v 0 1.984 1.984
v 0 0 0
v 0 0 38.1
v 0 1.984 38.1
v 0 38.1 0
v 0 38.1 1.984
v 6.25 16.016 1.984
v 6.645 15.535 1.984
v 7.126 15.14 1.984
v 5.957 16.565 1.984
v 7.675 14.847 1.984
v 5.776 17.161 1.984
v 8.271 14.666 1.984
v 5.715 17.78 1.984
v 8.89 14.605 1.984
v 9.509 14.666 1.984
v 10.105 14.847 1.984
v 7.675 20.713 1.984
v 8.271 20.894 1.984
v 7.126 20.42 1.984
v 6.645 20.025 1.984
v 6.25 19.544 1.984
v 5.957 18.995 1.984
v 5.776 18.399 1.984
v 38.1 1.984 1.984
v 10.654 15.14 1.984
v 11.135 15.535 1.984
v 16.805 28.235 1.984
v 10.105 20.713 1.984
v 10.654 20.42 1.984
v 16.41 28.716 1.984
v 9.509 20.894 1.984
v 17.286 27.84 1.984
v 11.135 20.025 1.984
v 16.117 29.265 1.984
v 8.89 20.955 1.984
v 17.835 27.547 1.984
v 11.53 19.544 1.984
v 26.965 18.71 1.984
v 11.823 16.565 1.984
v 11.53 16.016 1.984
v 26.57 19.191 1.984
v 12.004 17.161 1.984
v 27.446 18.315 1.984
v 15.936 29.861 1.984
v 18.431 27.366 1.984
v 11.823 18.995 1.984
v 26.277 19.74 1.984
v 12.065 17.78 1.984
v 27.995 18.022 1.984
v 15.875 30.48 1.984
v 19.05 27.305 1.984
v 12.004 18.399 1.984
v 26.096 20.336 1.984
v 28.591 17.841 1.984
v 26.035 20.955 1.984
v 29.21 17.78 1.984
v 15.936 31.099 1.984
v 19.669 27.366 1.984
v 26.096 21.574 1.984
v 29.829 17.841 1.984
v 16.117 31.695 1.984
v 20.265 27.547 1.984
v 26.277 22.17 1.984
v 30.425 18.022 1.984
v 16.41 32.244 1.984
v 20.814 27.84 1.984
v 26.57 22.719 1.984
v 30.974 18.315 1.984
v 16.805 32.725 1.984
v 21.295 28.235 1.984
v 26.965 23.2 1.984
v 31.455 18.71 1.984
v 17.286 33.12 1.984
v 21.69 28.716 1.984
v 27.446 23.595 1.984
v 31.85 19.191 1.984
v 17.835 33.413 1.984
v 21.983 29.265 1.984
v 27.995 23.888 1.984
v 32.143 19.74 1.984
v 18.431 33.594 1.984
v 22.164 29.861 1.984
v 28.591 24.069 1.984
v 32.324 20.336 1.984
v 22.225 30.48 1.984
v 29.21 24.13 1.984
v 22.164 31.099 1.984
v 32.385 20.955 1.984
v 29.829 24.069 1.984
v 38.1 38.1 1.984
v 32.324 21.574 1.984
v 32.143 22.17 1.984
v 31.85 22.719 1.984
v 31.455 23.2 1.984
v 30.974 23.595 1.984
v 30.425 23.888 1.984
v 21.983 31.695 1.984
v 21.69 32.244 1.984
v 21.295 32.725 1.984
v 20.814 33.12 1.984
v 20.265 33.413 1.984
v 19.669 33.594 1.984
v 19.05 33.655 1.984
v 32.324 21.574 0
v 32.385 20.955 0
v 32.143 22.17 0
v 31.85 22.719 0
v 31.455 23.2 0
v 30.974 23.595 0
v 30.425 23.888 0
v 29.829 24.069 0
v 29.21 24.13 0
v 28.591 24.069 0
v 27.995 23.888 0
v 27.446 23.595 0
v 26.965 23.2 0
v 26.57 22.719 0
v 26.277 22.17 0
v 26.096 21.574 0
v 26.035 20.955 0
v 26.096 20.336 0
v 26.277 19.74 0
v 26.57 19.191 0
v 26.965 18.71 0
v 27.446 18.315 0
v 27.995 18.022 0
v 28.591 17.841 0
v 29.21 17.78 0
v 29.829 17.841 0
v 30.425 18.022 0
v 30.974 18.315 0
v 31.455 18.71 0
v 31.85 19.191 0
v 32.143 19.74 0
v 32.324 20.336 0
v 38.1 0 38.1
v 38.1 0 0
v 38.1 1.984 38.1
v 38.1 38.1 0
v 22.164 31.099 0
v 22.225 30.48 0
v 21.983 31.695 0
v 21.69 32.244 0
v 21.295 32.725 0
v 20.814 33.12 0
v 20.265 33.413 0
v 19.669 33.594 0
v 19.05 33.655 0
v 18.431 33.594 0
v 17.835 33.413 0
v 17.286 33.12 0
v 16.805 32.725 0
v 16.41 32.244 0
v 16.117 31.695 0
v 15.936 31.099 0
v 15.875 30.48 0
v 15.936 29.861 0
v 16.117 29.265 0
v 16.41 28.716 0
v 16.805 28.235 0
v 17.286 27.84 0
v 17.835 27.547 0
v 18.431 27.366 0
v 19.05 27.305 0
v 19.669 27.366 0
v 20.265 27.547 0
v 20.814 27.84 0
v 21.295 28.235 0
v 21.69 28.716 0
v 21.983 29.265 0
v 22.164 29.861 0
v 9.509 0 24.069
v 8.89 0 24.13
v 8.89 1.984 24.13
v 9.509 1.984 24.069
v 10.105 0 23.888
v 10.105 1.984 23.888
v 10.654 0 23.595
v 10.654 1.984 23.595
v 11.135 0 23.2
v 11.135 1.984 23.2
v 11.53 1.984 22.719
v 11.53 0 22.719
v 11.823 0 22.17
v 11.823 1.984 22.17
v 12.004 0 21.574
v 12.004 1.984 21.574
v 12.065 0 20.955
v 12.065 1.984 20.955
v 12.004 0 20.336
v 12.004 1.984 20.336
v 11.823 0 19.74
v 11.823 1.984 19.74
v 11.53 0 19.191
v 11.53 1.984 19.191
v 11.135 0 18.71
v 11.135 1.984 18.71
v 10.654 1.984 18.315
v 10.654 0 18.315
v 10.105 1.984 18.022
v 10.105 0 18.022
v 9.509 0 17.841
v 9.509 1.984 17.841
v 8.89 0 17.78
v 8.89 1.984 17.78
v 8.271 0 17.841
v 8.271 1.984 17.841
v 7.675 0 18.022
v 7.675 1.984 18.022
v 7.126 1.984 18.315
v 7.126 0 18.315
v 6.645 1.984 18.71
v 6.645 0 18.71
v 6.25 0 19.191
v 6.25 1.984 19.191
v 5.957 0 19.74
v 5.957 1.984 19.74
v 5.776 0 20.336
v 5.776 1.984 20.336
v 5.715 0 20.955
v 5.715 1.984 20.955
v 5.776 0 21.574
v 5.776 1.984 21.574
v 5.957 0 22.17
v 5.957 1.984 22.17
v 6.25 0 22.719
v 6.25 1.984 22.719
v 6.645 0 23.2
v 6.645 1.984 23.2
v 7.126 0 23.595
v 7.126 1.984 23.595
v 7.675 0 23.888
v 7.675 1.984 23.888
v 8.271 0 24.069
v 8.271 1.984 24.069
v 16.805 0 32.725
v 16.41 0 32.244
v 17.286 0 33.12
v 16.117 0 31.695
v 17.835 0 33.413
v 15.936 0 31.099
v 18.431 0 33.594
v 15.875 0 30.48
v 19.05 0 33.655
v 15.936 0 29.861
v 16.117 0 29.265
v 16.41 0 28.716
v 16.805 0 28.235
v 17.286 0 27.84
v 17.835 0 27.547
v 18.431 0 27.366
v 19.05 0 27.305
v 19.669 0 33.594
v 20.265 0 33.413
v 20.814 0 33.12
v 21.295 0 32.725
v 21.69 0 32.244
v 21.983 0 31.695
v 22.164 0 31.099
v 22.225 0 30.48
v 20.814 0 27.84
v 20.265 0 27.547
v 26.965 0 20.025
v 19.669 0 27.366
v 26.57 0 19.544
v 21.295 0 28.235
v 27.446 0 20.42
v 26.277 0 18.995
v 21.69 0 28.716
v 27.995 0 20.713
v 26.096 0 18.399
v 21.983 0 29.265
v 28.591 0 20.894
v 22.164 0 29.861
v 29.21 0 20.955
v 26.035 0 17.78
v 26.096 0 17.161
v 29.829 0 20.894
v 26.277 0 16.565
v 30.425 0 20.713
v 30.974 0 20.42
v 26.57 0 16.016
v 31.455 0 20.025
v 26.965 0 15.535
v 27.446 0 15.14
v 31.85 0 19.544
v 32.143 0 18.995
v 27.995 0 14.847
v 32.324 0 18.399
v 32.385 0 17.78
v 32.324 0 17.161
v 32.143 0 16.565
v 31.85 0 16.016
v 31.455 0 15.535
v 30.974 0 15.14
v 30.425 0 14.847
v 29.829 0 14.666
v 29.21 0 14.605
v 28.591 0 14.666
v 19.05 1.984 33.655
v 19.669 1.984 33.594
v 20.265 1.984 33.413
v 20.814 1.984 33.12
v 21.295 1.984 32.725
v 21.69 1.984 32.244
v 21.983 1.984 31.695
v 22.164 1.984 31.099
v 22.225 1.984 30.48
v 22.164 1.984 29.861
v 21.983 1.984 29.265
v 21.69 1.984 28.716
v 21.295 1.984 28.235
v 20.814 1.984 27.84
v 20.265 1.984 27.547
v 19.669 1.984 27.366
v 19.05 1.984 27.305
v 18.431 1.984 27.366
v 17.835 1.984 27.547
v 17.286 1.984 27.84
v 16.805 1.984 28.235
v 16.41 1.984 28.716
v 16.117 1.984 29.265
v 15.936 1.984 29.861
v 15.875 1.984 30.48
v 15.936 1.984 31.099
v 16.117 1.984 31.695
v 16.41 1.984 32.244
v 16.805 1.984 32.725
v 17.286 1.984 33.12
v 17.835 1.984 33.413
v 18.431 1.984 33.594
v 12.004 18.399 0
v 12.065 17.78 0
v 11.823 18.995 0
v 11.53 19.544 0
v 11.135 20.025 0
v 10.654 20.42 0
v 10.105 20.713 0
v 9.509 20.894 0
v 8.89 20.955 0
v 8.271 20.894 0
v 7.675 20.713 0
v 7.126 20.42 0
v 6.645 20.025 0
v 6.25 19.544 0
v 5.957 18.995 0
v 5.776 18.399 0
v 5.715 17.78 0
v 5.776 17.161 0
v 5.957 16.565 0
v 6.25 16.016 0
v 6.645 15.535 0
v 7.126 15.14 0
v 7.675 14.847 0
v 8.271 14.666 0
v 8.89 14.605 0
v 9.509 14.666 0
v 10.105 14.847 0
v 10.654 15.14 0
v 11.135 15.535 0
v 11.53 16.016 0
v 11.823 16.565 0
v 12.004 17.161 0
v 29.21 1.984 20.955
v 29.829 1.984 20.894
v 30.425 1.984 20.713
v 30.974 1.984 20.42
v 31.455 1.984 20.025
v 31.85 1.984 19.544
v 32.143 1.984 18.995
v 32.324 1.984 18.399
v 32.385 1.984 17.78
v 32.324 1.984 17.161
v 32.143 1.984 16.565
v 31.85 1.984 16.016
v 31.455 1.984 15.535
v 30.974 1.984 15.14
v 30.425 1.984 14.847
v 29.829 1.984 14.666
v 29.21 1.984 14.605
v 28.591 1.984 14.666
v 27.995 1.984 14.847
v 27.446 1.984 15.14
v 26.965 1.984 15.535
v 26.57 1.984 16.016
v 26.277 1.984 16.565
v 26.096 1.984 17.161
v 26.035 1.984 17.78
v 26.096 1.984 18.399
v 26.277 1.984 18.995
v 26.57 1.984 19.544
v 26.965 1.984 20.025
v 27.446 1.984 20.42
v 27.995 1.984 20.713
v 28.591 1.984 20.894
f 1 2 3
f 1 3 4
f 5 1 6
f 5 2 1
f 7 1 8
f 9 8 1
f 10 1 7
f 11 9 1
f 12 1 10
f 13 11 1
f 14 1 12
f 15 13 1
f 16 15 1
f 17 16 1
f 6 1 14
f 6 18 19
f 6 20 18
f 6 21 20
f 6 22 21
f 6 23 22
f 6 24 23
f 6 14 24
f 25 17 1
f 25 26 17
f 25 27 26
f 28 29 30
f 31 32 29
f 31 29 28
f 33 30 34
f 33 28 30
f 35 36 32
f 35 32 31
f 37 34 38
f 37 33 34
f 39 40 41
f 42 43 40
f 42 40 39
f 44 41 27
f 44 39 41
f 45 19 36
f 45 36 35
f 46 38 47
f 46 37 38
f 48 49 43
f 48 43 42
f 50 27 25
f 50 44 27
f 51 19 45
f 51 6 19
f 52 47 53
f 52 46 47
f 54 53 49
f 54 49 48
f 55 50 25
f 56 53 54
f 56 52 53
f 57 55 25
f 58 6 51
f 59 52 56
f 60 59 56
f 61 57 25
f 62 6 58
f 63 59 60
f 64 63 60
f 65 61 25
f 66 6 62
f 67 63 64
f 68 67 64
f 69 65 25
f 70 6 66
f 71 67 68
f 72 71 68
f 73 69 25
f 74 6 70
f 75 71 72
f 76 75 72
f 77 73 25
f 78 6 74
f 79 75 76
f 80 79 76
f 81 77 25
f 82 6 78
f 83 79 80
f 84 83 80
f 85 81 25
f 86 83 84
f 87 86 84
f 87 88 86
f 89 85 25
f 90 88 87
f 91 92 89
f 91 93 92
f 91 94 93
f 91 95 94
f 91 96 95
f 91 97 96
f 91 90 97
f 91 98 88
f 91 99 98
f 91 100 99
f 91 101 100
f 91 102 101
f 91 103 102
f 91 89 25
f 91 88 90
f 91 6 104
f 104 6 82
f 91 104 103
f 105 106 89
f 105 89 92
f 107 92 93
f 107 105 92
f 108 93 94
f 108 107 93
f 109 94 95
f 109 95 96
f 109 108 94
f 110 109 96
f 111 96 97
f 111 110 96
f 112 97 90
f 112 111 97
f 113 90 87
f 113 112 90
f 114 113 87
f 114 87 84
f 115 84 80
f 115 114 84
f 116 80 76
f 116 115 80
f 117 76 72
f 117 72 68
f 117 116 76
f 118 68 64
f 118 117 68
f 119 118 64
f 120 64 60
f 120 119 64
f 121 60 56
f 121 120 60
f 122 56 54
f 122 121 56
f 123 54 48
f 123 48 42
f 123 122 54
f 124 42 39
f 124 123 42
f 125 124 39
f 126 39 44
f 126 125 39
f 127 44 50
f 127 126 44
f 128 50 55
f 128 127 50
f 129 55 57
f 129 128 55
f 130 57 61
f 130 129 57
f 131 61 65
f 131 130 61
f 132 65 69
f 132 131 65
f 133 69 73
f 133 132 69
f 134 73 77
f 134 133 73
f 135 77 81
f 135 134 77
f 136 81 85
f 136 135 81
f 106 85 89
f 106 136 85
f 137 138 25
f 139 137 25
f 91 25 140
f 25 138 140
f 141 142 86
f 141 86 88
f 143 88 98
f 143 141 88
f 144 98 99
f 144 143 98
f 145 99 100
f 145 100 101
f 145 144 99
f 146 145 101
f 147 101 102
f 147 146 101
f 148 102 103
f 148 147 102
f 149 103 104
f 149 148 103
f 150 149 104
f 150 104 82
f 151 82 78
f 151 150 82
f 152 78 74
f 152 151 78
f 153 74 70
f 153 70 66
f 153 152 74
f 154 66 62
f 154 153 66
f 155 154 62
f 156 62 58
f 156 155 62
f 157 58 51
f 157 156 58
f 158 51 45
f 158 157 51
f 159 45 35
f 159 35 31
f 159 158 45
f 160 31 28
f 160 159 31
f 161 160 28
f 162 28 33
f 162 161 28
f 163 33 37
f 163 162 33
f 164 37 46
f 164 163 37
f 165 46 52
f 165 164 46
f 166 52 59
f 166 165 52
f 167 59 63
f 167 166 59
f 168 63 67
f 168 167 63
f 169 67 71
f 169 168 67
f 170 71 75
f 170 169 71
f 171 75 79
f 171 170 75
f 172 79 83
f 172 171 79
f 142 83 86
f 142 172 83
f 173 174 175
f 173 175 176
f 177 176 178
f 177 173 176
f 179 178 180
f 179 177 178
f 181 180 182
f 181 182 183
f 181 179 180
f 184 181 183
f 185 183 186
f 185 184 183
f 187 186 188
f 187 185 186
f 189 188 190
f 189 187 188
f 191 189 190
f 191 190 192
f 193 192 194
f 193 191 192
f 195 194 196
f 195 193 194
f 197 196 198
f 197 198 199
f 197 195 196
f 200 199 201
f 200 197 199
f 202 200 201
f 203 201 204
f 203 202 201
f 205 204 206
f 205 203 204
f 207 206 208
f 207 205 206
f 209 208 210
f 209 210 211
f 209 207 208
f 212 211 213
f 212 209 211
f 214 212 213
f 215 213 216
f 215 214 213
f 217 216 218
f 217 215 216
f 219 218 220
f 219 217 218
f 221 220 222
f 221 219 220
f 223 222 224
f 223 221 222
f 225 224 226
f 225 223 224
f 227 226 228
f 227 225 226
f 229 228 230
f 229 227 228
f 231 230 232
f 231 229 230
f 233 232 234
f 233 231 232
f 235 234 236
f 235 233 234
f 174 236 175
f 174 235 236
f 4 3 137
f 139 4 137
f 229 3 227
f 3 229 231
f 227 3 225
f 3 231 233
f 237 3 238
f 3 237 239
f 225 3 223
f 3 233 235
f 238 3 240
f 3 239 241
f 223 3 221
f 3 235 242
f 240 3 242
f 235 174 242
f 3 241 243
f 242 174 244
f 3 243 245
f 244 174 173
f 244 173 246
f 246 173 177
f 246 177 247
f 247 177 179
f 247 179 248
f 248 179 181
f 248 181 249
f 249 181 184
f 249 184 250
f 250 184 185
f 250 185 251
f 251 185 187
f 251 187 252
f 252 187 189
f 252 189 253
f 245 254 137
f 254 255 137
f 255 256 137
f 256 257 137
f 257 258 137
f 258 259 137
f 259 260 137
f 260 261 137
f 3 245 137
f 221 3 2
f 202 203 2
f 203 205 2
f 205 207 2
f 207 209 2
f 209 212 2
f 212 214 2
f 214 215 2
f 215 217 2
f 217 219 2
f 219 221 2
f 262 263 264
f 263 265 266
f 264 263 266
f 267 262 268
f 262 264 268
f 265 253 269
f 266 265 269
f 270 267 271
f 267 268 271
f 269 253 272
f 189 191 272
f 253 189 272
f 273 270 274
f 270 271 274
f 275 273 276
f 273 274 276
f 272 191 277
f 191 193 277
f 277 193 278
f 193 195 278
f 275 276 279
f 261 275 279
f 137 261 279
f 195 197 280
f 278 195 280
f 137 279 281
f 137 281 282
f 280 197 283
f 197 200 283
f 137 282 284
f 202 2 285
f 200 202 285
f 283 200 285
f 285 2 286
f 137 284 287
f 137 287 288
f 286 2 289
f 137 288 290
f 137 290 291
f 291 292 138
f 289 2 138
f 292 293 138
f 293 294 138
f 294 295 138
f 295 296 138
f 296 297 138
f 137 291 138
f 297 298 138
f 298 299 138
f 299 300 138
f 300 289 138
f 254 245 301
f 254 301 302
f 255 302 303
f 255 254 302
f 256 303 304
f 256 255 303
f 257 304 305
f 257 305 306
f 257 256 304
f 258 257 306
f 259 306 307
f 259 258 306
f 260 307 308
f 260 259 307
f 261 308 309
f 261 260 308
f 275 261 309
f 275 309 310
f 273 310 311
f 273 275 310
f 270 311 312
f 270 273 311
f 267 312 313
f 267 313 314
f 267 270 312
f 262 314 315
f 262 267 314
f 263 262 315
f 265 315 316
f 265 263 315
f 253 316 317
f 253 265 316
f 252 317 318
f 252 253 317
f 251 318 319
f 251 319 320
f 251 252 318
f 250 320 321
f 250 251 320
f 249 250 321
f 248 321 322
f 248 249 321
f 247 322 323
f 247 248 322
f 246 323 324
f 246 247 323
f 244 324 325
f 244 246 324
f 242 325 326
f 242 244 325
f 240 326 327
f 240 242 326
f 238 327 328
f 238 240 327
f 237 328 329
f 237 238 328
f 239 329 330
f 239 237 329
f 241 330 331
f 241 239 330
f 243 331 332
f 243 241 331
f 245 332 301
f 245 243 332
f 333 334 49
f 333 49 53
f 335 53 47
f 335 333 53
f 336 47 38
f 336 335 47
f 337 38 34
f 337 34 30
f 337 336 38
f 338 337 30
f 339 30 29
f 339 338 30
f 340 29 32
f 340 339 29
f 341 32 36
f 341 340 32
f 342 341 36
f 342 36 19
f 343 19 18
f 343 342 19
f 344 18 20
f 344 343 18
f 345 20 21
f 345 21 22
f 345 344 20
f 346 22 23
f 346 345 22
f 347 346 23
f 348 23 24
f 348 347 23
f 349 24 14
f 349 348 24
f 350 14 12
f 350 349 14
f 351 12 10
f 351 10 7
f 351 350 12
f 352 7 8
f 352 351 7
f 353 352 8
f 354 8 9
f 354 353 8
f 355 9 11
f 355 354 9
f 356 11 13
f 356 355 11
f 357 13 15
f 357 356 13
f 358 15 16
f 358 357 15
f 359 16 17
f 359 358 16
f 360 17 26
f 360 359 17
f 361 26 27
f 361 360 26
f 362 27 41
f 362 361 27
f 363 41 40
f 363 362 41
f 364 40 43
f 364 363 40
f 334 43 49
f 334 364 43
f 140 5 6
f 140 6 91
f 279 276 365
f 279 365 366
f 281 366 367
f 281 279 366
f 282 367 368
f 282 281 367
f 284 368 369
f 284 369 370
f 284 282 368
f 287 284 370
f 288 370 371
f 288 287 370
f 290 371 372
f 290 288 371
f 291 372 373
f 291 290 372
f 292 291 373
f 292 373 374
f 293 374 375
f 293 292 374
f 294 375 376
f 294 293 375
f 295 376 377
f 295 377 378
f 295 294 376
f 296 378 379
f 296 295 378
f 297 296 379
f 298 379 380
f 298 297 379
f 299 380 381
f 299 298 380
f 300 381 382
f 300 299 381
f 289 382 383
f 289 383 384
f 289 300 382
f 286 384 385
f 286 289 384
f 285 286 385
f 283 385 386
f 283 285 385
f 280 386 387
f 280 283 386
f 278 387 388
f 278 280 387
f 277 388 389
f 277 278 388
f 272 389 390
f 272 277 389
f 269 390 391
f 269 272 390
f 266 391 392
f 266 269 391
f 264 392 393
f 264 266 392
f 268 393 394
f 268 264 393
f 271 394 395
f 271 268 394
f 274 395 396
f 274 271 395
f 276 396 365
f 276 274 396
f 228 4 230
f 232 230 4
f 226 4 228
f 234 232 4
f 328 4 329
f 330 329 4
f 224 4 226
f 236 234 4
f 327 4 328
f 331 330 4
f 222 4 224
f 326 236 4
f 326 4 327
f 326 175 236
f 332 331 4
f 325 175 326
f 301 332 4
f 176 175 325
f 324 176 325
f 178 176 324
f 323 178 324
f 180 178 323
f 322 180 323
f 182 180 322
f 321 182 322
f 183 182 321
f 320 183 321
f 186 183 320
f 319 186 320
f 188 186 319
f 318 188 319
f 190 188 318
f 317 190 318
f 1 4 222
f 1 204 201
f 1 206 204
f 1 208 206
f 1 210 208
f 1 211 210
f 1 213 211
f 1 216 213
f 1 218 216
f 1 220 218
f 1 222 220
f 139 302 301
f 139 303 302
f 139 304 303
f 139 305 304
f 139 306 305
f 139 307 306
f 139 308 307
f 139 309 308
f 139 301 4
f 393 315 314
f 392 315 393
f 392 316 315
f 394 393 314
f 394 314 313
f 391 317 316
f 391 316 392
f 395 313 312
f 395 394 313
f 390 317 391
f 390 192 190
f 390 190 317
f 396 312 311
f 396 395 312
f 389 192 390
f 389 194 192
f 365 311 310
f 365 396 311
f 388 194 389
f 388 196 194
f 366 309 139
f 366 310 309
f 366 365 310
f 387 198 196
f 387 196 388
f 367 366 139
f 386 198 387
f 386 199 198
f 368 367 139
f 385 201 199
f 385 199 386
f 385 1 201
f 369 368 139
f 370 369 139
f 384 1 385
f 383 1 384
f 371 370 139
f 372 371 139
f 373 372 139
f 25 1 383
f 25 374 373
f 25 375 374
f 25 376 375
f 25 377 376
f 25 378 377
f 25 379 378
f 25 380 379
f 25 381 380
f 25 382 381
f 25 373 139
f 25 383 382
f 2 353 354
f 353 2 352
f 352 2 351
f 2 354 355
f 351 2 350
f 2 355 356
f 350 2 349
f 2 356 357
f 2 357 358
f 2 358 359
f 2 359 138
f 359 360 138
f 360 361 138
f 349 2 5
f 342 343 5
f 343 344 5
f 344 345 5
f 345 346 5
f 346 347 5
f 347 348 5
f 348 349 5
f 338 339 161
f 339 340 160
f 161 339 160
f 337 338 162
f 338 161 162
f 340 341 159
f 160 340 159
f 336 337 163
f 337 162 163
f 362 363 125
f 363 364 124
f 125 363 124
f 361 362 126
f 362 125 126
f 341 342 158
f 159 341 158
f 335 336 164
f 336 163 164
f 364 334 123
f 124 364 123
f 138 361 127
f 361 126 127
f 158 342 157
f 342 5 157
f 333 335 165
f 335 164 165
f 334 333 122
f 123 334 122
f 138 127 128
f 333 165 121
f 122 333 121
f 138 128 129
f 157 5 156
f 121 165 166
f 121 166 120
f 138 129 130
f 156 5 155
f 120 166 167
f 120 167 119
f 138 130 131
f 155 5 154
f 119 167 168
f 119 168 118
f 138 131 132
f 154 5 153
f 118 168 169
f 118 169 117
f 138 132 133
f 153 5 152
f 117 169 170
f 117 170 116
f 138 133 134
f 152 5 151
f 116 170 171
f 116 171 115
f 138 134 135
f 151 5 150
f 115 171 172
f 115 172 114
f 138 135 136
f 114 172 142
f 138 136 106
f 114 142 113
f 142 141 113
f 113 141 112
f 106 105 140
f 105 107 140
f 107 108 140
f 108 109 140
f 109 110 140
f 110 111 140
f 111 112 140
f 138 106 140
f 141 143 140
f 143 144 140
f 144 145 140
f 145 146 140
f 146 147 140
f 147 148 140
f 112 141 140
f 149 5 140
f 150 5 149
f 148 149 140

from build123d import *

# Parameters (mm, degrees)
SKETCH1_W           = 38.1
SKETCH1_H           = 38.1
SKETCH1_R           = 3.175
BOSS_EXTRUDE1_DEPTH = 1.984375
SKETCH2_W           = 38.1
SKETCH2_H           = 36.115625
SKETCH2_R           = 3.175
BOSS_EXTRUDE2_DEPTH = 1.984375


with BuildPart() as part:
    # Sketch1 → Boss-Extrude1 (new body)
    with BuildSketch(Plane(origin=(0, 0, 0), x_dir=(1, 0, 0), z_dir=(0, 1, 0))):
        with Locations((19.05, -19.05)):
            Rectangle(SKETCH1_W, SKETCH1_H)
        with Locations(Location((19.05, -30.48, 0), (0, 0, 270))):
            Circle(SKETCH1_R, mode=Mode.SUBTRACT)
        with Locations(Location((8.89, -20.955, 0), (0, 0, 270))):
            Circle(SKETCH1_R, mode=Mode.SUBTRACT)
        with Locations(Location((29.21, -17.78, 0), (0, 0, 270))):
            Circle(SKETCH1_R, mode=Mode.SUBTRACT)
    extrude(amount=BOSS_EXTRUDE1_DEPTH)

    # Sketch2 → Boss-Extrude2 (add)
    with BuildSketch(Plane.XY):
        with Locations((19.05, 20.0421875)):
            Rectangle(SKETCH2_W, SKETCH2_H)
        with Locations((19.05, 30.48)):
            Circle(SKETCH2_R, mode=Mode.SUBTRACT)
        with Locations((8.89, 17.78)):
            Circle(SKETCH2_R, mode=Mode.SUBTRACT)
        with Locations((29.21, 20.955)):
            Circle(SKETCH2_R, mode=Mode.SUBTRACT)
    extrude(amount=BOSS_EXTRUDE2_DEPTH)


solid = part.part
